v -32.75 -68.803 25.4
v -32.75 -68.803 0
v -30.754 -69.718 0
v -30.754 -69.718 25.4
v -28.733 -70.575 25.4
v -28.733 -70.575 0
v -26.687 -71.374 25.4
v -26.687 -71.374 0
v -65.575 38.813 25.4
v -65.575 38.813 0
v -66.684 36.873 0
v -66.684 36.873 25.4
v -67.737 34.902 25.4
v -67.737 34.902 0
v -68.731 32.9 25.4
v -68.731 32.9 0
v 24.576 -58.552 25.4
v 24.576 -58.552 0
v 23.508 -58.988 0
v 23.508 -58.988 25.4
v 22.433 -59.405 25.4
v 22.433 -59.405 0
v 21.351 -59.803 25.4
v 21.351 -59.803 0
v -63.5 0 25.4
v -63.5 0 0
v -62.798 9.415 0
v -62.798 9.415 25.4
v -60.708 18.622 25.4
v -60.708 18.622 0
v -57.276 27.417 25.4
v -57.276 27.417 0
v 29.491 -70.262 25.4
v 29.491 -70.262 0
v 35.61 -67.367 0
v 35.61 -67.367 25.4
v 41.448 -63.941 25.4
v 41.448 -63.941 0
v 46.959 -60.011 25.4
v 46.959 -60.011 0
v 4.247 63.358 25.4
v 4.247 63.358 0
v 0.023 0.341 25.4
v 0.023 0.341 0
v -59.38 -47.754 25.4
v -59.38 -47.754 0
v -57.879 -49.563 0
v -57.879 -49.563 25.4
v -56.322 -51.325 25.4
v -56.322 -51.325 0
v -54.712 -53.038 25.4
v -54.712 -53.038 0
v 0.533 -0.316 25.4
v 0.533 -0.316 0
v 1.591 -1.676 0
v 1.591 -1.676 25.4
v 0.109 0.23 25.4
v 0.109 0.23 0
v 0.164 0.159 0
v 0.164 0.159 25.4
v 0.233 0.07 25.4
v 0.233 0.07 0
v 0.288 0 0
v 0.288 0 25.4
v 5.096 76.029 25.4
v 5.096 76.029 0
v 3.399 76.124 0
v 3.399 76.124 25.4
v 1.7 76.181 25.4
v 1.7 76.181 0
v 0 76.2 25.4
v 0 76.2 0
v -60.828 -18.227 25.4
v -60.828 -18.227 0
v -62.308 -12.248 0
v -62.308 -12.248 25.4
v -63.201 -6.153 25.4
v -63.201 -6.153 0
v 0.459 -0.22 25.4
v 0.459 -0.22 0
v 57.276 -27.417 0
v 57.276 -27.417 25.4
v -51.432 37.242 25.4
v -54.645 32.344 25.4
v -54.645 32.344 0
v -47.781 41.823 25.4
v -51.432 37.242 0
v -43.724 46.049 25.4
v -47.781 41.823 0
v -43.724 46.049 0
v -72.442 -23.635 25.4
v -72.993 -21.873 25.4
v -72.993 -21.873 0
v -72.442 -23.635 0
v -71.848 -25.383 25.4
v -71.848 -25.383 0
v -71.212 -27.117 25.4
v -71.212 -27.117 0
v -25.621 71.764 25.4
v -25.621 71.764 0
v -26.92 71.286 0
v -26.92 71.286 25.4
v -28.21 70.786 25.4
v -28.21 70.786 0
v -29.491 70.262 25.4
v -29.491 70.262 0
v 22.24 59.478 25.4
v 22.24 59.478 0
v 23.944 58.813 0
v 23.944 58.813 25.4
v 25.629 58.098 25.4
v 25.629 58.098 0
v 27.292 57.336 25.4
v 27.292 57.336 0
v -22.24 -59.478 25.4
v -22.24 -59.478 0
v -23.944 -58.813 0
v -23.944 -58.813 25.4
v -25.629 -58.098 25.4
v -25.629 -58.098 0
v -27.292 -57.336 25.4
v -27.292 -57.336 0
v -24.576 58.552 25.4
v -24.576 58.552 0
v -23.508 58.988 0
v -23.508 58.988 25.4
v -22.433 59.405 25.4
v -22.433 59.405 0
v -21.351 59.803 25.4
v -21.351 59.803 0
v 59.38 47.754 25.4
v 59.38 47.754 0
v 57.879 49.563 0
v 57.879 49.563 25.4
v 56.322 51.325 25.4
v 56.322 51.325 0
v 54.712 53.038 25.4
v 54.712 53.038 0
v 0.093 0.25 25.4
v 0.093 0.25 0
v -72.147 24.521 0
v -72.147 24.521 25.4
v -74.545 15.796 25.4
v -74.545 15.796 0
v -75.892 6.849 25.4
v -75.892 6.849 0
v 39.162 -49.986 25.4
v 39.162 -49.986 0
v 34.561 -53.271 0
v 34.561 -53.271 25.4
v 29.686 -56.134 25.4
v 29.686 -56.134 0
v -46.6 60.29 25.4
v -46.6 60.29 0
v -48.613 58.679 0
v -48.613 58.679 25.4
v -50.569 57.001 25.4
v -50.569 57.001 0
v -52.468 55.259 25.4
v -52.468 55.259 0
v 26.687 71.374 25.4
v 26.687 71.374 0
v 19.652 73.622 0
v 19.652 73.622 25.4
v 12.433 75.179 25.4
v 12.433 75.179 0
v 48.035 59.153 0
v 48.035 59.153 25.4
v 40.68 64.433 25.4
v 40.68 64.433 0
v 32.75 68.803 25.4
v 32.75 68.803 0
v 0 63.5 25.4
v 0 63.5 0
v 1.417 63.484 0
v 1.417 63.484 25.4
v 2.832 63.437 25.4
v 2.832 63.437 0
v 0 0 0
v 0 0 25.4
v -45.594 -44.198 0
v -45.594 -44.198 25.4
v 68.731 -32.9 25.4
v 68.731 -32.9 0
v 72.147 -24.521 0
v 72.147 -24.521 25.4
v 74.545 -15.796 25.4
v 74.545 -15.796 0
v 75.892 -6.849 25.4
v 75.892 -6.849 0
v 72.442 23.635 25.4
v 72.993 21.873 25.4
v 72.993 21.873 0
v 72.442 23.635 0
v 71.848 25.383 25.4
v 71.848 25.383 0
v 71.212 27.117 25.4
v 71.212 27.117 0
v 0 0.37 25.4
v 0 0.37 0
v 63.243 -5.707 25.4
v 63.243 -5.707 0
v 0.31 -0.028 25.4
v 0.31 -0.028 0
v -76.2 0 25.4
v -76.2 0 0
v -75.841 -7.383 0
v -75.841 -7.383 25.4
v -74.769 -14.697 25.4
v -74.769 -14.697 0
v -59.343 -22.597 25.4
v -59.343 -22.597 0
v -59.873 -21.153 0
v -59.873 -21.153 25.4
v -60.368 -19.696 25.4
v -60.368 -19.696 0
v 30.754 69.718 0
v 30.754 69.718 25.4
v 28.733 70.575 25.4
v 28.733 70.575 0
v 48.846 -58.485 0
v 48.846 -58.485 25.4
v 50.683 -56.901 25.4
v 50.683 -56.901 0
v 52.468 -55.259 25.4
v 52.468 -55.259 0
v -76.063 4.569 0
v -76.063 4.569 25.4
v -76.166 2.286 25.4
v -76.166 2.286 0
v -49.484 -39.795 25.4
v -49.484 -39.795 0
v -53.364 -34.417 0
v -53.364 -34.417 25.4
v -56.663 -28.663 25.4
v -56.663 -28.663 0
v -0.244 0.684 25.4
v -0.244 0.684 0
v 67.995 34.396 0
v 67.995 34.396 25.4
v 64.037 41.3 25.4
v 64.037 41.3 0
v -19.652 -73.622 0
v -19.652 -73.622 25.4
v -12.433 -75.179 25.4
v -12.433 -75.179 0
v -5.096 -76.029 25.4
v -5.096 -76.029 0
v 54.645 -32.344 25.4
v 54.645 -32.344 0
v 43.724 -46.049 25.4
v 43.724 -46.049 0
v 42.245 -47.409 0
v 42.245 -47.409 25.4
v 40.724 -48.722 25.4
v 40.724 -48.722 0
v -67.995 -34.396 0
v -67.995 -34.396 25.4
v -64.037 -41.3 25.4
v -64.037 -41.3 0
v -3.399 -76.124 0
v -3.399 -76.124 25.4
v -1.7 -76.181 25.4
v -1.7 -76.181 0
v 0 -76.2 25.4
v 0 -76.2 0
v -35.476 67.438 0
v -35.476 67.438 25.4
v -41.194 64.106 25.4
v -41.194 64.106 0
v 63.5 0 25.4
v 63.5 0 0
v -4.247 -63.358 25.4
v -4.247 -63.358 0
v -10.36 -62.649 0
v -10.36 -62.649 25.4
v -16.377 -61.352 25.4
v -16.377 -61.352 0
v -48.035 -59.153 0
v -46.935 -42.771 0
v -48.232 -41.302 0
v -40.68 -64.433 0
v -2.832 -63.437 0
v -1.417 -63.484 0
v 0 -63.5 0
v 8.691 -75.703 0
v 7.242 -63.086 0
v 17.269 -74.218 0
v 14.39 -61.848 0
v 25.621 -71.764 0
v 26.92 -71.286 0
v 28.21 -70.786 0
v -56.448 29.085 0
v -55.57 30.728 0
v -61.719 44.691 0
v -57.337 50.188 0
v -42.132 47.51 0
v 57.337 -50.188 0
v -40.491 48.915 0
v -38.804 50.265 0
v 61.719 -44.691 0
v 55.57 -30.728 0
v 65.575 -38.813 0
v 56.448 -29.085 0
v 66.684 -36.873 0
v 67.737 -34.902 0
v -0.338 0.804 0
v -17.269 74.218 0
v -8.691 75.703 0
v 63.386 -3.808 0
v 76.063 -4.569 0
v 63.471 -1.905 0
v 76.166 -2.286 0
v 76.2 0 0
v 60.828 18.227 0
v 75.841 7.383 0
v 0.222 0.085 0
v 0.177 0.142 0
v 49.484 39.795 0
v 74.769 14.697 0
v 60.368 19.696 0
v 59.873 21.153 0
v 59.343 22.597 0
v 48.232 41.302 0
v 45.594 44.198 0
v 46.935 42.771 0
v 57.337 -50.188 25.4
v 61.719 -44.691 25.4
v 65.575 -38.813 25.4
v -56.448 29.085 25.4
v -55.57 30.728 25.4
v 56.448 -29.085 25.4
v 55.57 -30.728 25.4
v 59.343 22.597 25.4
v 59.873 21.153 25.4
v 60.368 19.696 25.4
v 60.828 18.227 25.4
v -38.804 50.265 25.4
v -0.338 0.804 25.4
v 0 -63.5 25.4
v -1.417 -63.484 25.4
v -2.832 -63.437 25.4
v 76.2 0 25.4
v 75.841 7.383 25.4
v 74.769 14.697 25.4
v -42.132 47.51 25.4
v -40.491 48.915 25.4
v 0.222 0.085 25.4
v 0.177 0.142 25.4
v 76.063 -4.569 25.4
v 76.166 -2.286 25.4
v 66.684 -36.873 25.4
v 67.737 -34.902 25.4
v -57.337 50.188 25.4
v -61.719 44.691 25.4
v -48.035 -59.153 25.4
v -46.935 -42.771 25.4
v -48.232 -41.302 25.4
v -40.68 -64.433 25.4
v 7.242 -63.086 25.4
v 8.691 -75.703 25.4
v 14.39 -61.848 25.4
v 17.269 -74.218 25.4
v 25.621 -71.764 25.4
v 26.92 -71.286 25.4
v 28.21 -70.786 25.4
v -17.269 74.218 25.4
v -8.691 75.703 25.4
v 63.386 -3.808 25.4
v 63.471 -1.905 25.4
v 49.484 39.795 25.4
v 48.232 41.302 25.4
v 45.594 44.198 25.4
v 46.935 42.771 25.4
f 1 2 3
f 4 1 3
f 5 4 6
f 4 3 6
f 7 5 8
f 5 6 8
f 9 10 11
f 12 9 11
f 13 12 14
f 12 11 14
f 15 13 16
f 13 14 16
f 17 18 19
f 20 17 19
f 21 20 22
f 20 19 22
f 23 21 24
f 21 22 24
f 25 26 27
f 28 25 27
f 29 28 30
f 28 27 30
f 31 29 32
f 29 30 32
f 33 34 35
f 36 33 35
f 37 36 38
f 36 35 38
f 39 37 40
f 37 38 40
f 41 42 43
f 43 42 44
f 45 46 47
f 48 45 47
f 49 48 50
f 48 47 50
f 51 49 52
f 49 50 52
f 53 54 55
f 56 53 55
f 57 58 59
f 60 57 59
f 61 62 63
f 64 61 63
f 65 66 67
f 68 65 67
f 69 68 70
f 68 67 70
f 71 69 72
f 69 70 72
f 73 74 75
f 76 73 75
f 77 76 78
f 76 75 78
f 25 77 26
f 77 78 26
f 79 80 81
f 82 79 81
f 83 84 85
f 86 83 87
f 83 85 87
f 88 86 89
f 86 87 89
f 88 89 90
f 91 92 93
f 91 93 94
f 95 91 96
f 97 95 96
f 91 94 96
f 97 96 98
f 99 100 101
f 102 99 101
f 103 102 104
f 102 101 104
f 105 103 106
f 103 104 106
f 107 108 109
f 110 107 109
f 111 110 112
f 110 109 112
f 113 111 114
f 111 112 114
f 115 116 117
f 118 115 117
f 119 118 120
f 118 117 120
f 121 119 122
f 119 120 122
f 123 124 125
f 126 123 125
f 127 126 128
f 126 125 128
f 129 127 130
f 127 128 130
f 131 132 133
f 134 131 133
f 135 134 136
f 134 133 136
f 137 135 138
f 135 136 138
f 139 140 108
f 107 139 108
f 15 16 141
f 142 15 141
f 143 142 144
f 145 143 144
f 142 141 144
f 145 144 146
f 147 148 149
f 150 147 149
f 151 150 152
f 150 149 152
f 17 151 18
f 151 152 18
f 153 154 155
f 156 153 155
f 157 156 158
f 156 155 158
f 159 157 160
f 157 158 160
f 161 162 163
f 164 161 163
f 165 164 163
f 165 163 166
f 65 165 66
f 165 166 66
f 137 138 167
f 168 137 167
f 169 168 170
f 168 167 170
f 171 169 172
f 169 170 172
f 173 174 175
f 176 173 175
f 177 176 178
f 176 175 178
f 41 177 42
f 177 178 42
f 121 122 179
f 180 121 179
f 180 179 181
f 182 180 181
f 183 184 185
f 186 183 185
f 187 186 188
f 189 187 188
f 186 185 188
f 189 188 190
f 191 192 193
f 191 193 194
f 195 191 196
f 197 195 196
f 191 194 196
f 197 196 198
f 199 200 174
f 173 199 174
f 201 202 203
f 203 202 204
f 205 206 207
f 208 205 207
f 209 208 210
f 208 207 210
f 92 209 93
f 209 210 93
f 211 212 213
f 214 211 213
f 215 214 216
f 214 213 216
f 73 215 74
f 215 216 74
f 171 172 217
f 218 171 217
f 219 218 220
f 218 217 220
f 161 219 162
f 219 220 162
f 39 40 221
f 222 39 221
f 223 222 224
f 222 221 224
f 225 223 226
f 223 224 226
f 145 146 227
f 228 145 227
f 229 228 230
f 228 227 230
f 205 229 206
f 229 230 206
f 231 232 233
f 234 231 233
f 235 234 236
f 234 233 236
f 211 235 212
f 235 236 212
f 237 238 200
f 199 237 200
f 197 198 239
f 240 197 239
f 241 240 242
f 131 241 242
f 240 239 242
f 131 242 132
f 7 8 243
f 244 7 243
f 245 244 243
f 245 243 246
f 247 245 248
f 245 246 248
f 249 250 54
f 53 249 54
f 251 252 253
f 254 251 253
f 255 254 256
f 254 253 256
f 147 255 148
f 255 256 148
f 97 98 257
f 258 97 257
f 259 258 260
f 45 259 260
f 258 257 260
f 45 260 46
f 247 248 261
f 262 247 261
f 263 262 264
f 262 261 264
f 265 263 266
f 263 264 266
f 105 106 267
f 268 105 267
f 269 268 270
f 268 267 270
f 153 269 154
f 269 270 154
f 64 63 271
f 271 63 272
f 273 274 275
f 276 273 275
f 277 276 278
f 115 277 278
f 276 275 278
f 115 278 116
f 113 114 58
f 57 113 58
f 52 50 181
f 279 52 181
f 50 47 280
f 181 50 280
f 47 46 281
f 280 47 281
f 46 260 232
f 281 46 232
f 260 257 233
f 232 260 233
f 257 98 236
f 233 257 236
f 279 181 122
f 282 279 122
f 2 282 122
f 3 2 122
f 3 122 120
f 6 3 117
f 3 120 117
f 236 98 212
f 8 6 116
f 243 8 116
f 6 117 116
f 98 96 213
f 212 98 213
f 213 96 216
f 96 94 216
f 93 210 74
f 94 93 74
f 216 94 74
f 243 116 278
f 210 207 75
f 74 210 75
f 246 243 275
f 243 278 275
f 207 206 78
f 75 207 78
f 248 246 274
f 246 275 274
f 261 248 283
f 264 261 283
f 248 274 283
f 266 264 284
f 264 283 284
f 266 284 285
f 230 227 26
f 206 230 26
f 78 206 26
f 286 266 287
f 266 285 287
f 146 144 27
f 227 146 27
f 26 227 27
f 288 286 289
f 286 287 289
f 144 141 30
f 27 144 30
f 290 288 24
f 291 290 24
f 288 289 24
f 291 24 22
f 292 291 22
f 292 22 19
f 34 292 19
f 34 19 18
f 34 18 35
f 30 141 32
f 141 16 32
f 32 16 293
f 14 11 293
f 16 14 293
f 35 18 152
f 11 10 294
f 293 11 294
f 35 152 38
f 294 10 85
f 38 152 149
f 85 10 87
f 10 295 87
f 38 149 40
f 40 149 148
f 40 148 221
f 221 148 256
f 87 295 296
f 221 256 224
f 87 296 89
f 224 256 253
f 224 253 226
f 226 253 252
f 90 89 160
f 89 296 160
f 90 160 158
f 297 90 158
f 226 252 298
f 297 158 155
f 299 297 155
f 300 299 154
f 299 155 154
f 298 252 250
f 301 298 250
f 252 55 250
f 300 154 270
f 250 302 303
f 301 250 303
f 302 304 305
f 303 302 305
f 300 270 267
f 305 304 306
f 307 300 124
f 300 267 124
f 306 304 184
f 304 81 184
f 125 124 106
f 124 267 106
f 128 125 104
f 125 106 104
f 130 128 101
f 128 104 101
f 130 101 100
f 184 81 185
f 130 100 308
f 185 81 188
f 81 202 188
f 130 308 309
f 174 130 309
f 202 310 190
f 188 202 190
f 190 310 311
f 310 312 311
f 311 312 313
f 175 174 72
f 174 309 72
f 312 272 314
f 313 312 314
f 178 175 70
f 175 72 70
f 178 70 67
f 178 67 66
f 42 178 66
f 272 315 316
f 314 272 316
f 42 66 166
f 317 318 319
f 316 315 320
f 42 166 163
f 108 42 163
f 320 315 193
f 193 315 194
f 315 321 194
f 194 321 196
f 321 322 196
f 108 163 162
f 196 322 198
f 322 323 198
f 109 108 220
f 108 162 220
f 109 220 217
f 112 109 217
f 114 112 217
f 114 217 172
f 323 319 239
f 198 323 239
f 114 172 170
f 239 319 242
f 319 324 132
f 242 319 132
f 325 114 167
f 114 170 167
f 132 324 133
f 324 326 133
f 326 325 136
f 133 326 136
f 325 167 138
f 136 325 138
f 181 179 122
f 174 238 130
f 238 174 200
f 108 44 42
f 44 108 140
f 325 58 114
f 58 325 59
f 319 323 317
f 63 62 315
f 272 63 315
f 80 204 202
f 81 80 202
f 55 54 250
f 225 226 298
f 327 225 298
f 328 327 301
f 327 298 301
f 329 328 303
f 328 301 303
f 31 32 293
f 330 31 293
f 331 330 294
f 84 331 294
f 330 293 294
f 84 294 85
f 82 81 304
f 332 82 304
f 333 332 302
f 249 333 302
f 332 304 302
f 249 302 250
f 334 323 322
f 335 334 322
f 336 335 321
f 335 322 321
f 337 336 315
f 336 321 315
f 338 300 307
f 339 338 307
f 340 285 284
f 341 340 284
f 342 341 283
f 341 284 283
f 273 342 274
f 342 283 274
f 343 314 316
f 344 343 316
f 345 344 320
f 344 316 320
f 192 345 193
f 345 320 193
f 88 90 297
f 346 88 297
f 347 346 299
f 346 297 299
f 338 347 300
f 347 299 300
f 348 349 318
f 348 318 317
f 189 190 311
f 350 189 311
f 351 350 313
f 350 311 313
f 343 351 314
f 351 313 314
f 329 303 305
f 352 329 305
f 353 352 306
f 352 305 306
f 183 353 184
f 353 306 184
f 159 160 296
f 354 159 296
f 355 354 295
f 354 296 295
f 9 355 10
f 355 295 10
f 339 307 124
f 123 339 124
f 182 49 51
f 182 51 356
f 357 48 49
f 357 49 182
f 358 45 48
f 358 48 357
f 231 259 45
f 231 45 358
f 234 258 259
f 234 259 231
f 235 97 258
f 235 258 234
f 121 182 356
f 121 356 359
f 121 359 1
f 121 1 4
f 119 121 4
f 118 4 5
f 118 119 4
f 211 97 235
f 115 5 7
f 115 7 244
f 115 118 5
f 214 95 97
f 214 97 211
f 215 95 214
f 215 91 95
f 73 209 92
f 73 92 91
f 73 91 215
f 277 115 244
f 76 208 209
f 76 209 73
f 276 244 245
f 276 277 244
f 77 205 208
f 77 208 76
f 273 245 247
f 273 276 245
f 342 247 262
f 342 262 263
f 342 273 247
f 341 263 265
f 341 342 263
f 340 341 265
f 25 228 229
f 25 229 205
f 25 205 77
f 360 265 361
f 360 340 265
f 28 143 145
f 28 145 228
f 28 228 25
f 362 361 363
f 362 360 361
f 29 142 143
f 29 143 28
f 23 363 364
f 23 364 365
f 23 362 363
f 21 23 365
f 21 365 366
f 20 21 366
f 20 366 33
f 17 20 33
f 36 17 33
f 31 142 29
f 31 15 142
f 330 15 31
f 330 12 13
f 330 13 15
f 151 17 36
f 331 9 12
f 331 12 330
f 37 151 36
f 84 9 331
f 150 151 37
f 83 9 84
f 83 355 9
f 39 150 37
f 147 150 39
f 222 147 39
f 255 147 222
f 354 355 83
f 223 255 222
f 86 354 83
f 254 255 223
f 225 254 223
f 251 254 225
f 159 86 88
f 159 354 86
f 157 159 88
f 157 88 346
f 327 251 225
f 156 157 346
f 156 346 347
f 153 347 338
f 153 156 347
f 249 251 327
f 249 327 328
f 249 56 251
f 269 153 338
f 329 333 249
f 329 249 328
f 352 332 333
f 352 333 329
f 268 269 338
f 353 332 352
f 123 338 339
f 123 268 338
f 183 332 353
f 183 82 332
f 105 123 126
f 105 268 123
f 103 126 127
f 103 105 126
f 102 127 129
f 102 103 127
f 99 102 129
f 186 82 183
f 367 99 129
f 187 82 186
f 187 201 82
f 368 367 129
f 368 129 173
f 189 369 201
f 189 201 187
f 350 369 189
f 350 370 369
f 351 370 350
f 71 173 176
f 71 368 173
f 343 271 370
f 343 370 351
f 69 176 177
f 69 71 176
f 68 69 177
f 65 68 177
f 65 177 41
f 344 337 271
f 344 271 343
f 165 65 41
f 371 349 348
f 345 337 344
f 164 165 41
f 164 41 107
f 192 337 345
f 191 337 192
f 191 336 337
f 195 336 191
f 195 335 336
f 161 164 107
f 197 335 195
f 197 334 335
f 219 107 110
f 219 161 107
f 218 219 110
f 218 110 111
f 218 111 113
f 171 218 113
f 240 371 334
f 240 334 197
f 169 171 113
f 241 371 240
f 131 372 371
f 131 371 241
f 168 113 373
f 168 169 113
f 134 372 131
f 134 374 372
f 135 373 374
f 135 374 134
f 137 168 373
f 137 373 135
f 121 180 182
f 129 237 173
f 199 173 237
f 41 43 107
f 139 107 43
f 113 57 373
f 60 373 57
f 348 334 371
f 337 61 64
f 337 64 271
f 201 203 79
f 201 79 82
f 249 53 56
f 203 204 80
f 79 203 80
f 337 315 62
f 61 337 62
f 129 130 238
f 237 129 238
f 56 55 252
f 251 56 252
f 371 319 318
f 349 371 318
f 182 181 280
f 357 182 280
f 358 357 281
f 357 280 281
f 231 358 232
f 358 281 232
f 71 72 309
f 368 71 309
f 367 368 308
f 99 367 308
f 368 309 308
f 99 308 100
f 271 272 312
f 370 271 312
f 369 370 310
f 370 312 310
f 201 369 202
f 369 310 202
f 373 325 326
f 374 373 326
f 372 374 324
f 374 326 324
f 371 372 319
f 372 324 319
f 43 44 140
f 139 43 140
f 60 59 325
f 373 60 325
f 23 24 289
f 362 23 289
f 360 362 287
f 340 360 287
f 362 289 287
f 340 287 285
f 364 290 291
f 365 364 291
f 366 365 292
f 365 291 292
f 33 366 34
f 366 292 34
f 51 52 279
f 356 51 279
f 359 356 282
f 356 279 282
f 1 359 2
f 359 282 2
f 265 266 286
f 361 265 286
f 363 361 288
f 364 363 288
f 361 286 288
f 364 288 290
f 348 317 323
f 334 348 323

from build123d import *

# Parameters (mm, degrees)
F1_DEPTH = 25.4
F2_DEPTH = 25.4
F3_DEPTH = 25.4


with BuildPart() as f1:
    # F0 (on Top) → F1 (new body)
    with BuildSketch(Plane.XY):
        with BuildLine():
            ThreePointArc((-54.6454294548, 32.3438872076), (-49.6595784817, 39.574944915), (-43.7236170719, 46.0488361432))
            Line((-43.7236170719, 46.0488361432), (-52.4683404863, 55.2586033719))
            ThreePointArc((-52.4683404863, 55.2586033719), (-59.591494178, 47.489933898), (-65.5745153458, 38.8126646491))
            Line((-65.5745153458, 38.8126646491), (-54.6454294548, 32.3438872076))
        make_face()
        with BuildLine():
            Line((-52.4683404863, 55.2586033719), (-43.7236170719, 46.0488361432))
            ThreePointArc((-43.7236170719, 46.0488361432), (-41.3174458853, 48.2194842933), (-38.8036697839, 50.2645522342))
            Line((-38.8036697839, 50.2645522342), (-46.6003690954, 60.2896807105))
            ThreePointArc((-46.6003690954, 60.2896807105), (-49.5981878635, 57.8485934199), (-52.4683404863, 55.2586033719))
        make_face()
        with BuildLine():
            Line((-46.6003690954, 60.2896807105), (-38.8036697839, 50.2645522342))
            ThreePointArc((-38.8036697839, 50.2645522342), (-31.9594802346, 54.8711365212), (-24.5758212425, 58.5515073269))
            Line((-24.5758212425, 58.5515073269), (-29.490985491, 70.2618087923))
            ThreePointArc((-29.490985491, 70.2618087923), (-38.3710098293, 65.8339244211), (-46.6003690954, 60.2896807105))
        make_face()
        with BuildLine():
            Line((-29.490985491, 70.2618087923), (-24.5758212425, 58.5515073269))
            ThreePointArc((-24.5758212425, 58.5515073269), (-22.971715152, 59.1992424189), (-21.3505595618, 59.80304011))
            Line((-21.3505595618, 59.80304011), (-25.6206714742, 71.763648132))
            ThreePointArc((-25.6206714742, 71.763648132), (-27.5660581824, 71.0390909027), (-29.490985491, 70.2618087923))
        make_face()
        with BuildLine():
            ThreePointArc((-21.3505595618, 59.80304011), (-10.8341347835, 62.5689341726), (0, 63.5))
            Line((0, 63.5), (0, 76.2))
            ThreePointArc((0, 76.2), (-13.0009617403, 75.0827210071), (-25.6206714742, 71.763648132))
            Line((-25.6206714742, 71.763648132), (-21.3505595618, 59.80304011))
        make_face()
        with BuildLine():
            Line((0, 76.2), (0, 63.5))
            ThreePointArc((0, 63.5), (2.1245390247, 63.4644493708), (4.2466991927, 63.3578372892))
            Line((4.2466991927, 63.3578372892), (5.0960390312, 76.0294047471))
            ThreePointArc((5.0960390312, 76.0294047471), (2.5494468296, 76.1573392449), (0, 76.2))
        make_face()
        with BuildLine():
            ThreePointArc((4.2466991927, 63.3578372892), (13.3844402215, 62.0733981667), (22.2395451076, 59.4781693852))
            Line((22.2395451075, 59.4781693852), (26.6874541291, 71.3738032622))
            ThreePointArc((26.6874541291, 71.3738032622), (16.0613282658, 74.4880778), (5.0960390312, 76.0294047471))
            Line((5.0960390312, 76.0294047471), (4.2466991927, 63.3578372892))
        make_face()
        with BuildLine():
            Line((27.2918502922, 57.335895455), (32.7502203506, 68.803074546))
            ThreePointArc((32.7502203506, 68.803074546), (29.74662079, 70.1539631922), (26.6874541291, 71.3738032622))
            Line((26.6874541291, 71.3738032622), (22.2395451075, 59.4781693852))
            ThreePointArc((22.2395451076, 59.4781693852), (24.7888506583, 58.4616359935), (27.2918502922, 57.335895455))
        make_face()
        with BuildLine():
            Line((45.5935282898, 44.1981920229), (54.7122339477, 53.0378304275))
            ThreePointArc((54.7122339477, 53.0378304275), (44.4359759486, 61.9022135428), (32.7502203506, 68.803074546))
            Line((32.7502203506, 68.803074546), (27.2918502922, 57.335895455))
            ThreePointArc((27.2918502922, 57.335895455), (37.0299799571, 51.5851779523), (45.5935282898, 44.1981920229))
        make_face()
        with BuildLine():
            Line((49.4835493014, 39.7948281631), (59.3802591617, 47.7537937958))
            ThreePointArc((59.3802591617, 47.7537937958), (57.1073945016, 50.4498314491), (54.7122339477, 53.0378304275))
            Line((54.7122339477, 53.0378304275), (45.5935282898, 44.1981920229))
            ThreePointArc((45.5935282898, 44.1981920229), (47.589495418, 42.0415262075), (49.4835493014, 39.7948281631))
        make_face()
        with BuildLine():
            Line((59.3431659035, 22.5973153393), (71.2117990842, 27.1167784072))
            ThreePointArc((71.2117990842, 27.1167784072), (66.106300912, 37.8998282283), (59.3802591617, 47.7537937958))
            Line((59.3802591617, 47.7537937958), (49.4835493014, 39.7948281631))
            ThreePointArc((49.4835493014, 39.7948281631), (55.0885840933, 31.5831901902), (59.3431659035, 22.5973153393))
        make_face()
        with BuildLine():
            Line((60.8277151615, 18.2274262647), (72.9932581938, 21.8729115177))
            ThreePointArc((72.9932581938, 21.8729115177), (72.1501848309, 24.5110348389), (71.2117990842, 27.1167784072))
            Line((71.2117990842, 27.1167784072), (59.3431659035, 22.5973153393))
            ThreePointArc((59.3431659035, 22.5973153393), (60.1251540257, 20.4258623657), (60.8277151615, 18.2274262647))
        make_face()
        with BuildLine():
            ThreePointArc((-60.8277151615, -18.2274262647), (-62.8283769994, -9.2111369344), (-63.5, 0))
            Line((-63.5, 0), (-76.2, 0))
            ThreePointArc((-76.2, 0), (-75.3940523993, -11.0533643212), (-72.9932581938, -21.8729115177))
            Line((-72.9932581938, -21.8729115177), (-60.8277151615, -18.2274262647))
        make_face()
        with BuildLine():
            Line((-76.2, 0), (-63.5, 0))
            ThreePointArc((-63.5, 0), (-63.4357184014, 2.8565067652), (-63.2430037512, 5.7072301974))
            Line((-63.2430037512, 5.7072301974), (-75.8916045014, 6.8486762369))
            ThreePointArc((-75.8916045014, 6.8486762369), (-76.1228620817, 3.4278081182), (-76.2, 0))
        make_face()
        with BuildLine():
            ThreePointArc((68.7314420597, -32.9002868133), (73.4753564303, -20.1943555836), (75.8916045014, -6.8486762369))
            Line((75.8916045014, -6.8486762369), (63.2430037512, -5.7072301974))
            ThreePointArc((63.2430037512, -5.7072301974), (61.2294636919, -16.828629653), (57.2762017164, -27.4169056777))
            Line((57.2762017164, -27.4169056777), (68.7314420597, -32.9002868133))
        make_face()
        with BuildLine():
            ThreePointArc((65.5745153458, -38.8126646491), (67.218015454, -35.8912022428), (68.7314420597, -32.9002868133))
            Line((68.7314420597, -32.9002868133), (57.2762017164, -27.4169056777))
            ThreePointArc((57.2762017164, -27.4169056777), (56.0150128783, -29.9093352023), (54.6454294548, -32.3438872076))
            Line((54.6454294548, -32.3438872076), (65.5745153458, -38.8126646491))
        make_face()
        with BuildLine():
            ThreePointArc((52.4683404863, -55.2586033719), (59.591494178, -47.489933898), (65.5745153458, -38.8126646491))
            Line((65.5745153458, -38.8126646491), (54.6454294548, -32.3438872076))
            ThreePointArc((54.6454294548, -32.3438872076), (49.6595784817, -39.574944915), (43.7236170719, -46.0488361432))
            Line((43.7236170719, -46.0488361432), (52.4683404863, -55.2586033719))
        make_face()
        with BuildLine():
            ThreePointArc((46.9591074707, -60.0106842617), (49.7704723708, -57.7004339671), (52.4683404863, -55.2586033719))
            Line((52.4683404863, -55.2586033719), (43.7236170719, -46.0488361432))
            ThreePointArc((43.7236170719, -46.0488361432), (41.4897304768, -48.0713247681), (39.1624081592, -49.9855557853))
            Line((39.1624081592, -49.9855557854), (46.9591074707, -60.0106842617))
        make_face()
        with BuildLine():
            ThreePointArc((39.1624081592, -49.9855557853), (32.1556270856, -54.7564210548), (24.5758212425, -58.5515073269))
            Line((24.5758212425, -58.5515073269), (29.490985491, -70.2618087923))
            ThreePointArc((29.490985491, -70.2618087923), (38.5671565843, -65.7192090108), (46.9591074707, -60.0106842617))
            Line((46.9591074707, -60.0106842617), (39.1624081592, -49.9855557854))
        make_face()
        with BuildLine():
            Line((29.490985491, -70.2618087923), (24.5758212425, -58.5515073269))
            ThreePointArc((24.5758212425, -58.5515073269), (22.971715152, -59.1992424189), (21.3505595618, -59.80304011))
            Line((21.3505595618, -59.80304011), (25.6206714742, -71.763648132))
            ThreePointArc((25.6206714742, -71.763648132), (27.5660581824, -71.0390909027), (29.490985491, -70.2618087923))
        make_face()
        with BuildLine():
            ThreePointArc((21.3505595618, -59.80304011), (10.8341347835, -62.5689341726), (0, -63.5))
            Line((0, -63.5), (0, -76.2))
            ThreePointArc((0, -76.2), (13.0009617403, -75.0827210071), (25.6206714742, -71.763648132))
            Line((25.6206714742, -71.763648132), (21.3505595618, -59.80304011))
        make_face()
        with BuildLine():
            Line((0, -76.2), (0, -63.5))
            ThreePointArc((0, -63.5), (-2.1245390247, -63.4644493708), (-4.2466991927, -63.3578372892))
            Line((-4.2466991927, -63.3578372892), (-5.0960390312, -76.0294047471))
            ThreePointArc((-5.0960390312, -76.0294047471), (-2.5494468296, -76.1573392449), (0, -76.2))
        make_face()
        with BuildLine():
            ThreePointArc((-4.2466991927, -63.3578372892), (-13.3844402215, -62.0733981667), (-22.2395451076, -59.4781693852))
            Line((-22.2395451075, -59.4781693852), (-26.6874541291, -71.3738032622))
            ThreePointArc((-26.6874541291, -71.3738032622), (-16.0613282658, -74.4880778), (-5.0960390312, -76.0294047471))
            Line((-5.0960390312, -76.0294047471), (-4.2466991927, -63.3578372892))
        make_face()
        with BuildLine():
            Line((-26.6874541291, -71.3738032622), (-22.2395451075, -59.4781693852))
            ThreePointArc((-22.2395451076, -59.4781693852), (-24.7888506583, -58.4616359935), (-27.2918502922, -57.335895455))
            Line((-27.2918502922, -57.335895455), (-32.7502203506, -68.803074546))
            ThreePointArc((-32.7502203506, -68.803074546), (-29.74662079, -70.1539631922), (-26.6874541291, -71.3738032622))
        make_face()
        with BuildLine():
            ThreePointArc((-27.2918502922, -57.335895455), (-37.0299799571, -51.5851779523), (-45.5935282898, -44.1981920229))
            Line((-45.5935282898, -44.1981920229), (-54.7122339477, -53.0378304275))
            ThreePointArc((-54.7122339477, -53.0378304275), (-44.4359759486, -61.9022135428), (-32.7502203506, -68.803074546))
            Line((-32.7502203506, -68.803074546), (-27.2918502922, -57.335895455))
        make_face()
        with BuildLine():
            ThreePointArc((-49.4835493014, -39.7948281631), (-55.0885840933, -31.5831901902), (-59.3431659035, -22.5973153393))
            Line((-59.3431659035, -22.5973153393), (-71.2117990842, -27.1167784072))
            ThreePointArc((-71.2117990842, -27.1167784072), (-66.106300912, -37.8998282283), (-59.3802591617, -47.7537937958))
            Line((-59.3802591617, -47.7537937958), (-49.4835493014, -39.7948281631))
        make_face()
        with BuildLine():
            Line((63.5, 0), (76.2, 0))
            ThreePointArc((76.2, 0), (75.3940523993, 11.0533643212), (72.9932581938, 21.8729115177))
            Line((72.9932581938, 21.8729115177), (60.8277151615, 18.2274262647))
            ThreePointArc((60.8277151615, 18.2274262647), (62.8283769994, 9.2111369344), (63.5, 0))
        make_face()
        with BuildLine():
            ThreePointArc((-63.2430037512, 5.7072301974), (-61.2294636919, 16.828629653), (-57.2762017164, 27.4169056777))
            Line((-57.2762017164, 27.4169056777), (-68.7314420597, 32.9002868133))
            ThreePointArc((-68.7314420597, 32.9002868133), (-73.4753564303, 20.1943555836), (-75.8916045014, 6.8486762369))
            Line((-75.8916045014, 6.8486762369), (-63.2430037512, 5.7072301974))
        make_face()
        with BuildLine():
            Line((-54.7122339477, -53.0378304275), (-45.5935282898, -44.1981920229))
            ThreePointArc((-45.5935282898, -44.1981920229), (-47.589495418, -42.0415262075), (-49.4835493014, -39.7948281631))
            Line((-49.4835493014, -39.7948281631), (-59.3802591617, -47.7537937958))
            ThreePointArc((-59.3802591617, -47.7537937958), (-57.1073945016, -50.4498314491), (-54.7122339477, -53.0378304275))
        make_face()
        with BuildLine():
            Line((-71.2117990842, -27.1167784072), (-59.3431659035, -22.5973153393))
            ThreePointArc((-59.3431659035, -22.5973153393), (-60.1251540257, -20.4258623657), (-60.8277151615, -18.2274262647))
            Line((-60.8277151615, -18.2274262647), (-72.9932581938, -21.8729115177))
            ThreePointArc((-72.9932581938, -21.8729115177), (-72.1501848309, -24.5110348389), (-71.2117990842, -27.1167784072))
        make_face()
        with BuildLine():
            ThreePointArc((75.8916045014, -6.8486762369), (76.1228620817, -3.4278081182), (76.2, 0))
            Line((76.2, 0), (63.5, 0))
            ThreePointArc((63.5, 0), (63.4357184014, -2.8565067652), (63.2430037512, -5.7072301974))
            Line((63.2430037512, -5.7072301974), (75.8916045014, -6.8486762369))
        make_face()
        with BuildLine():
            Line((-68.7314420597, 32.9002868133), (-57.2762017164, 27.4169056777))
            ThreePointArc((-57.2762017164, 27.4169056777), (-56.0150128783, 29.9093352023), (-54.6454294548, 32.3438872076))
            Line((-54.6454294548, 32.3438872076), (-65.5745153458, 38.8126646491))
            ThreePointArc((-65.5745153458, 38.8126646491), (-67.218015454, 35.8912022428), (-68.7314420597, 32.9002868133))
        make_face()
    extrude(amount=F1_DEPTH)

    # F0 (on Top) → F2 (join)
    with BuildSketch(Plane.XY):
        with BuildLine():
            Line((-38.8036697839, 50.2645522342), (-0.3375081808, 0.8041079289))
            Line((-0.3375081808, 0.8041079289), (-24.5758212425, 58.5515073269))
            ThreePointArc((-24.5758212425, 58.5515073269), (-31.9594802346, 54.8711365212), (-38.8036697839, 50.2645522342))
        make_face()
        with BuildLine():
            Line((-0.2442825508, 0.6842368296), (0, 0.3701341743))
            Line((0, 0.3701341743), (0, 63.5))
            ThreePointArc((0, 63.5), (-10.8341347835, 62.5689341726), (-21.3505595618, 59.80304011))
            Line((-21.3505595618, 59.80304011), (-0.2442825508, 0.6842368296))
        make_face()
        with BuildLine():
            Line((0.0228405548, 0.3407654008), (0.0934623297, 0.2499587223))
            Line((0.0934623297, 0.2499587223), (22.2395451075, 59.4781693852))
            ThreePointArc((22.2395451076, 59.4781693852), (13.3844402215, 62.0733981667), (4.2466991927, 63.3578372892))
            Line((4.2466991927, 63.3578372892), (0.0228405548, 0.3407654008))
        make_face()
        with BuildLine():
            Line((0.1092917989, 0.2296049219), (0.1641238083, 0.1591009923))
            Line((0.1641238083, 0.1591009923), (45.5935282898, 44.1981920229))
            ThreePointArc((45.5935282898, 44.1981920229), (37.0299799571, 51.5851779523), (27.2918502922, 57.335895455))
            Line((27.2918502922, 57.335895455), (0.1092917989, 0.2296049219))
        make_face()
        with BuildLine():
            Line((0.222088386, 0.0845691532), (59.3431659035, 22.5973153393))
            ThreePointArc((59.3431659035, 22.5973153393), (55.0885840933, 31.5831901902), (49.4835493014, 39.7948281631))
            Line((49.4835493014, 39.7948281631), (0.1770959808, 0.1424211525))
            Line((0.1770959808, 0.1424211525), (0.222088386, 0.0845691532))
        make_face()
        with BuildLine():
            Line((0.28785914, 0), (63.5, 0))
            ThreePointArc((63.5, 0), (62.8283769994, 9.2111369344), (60.8277151615, 18.2274262647))
            Line((60.8277151615, 18.2274262647), (0.2334533831, 0.0699558469))
            Line((0.2334533831, 0.0699558469), (0.28785914, 0))
        make_face()
        with BuildLine():
            ThreePointArc((57.2762017164, -27.4169056777), (61.2294636919, -16.828629653), (63.2430037512, -5.7072301974))
            Line((63.2430037512, -5.7072301974), (0.3095869732, -0.0279380171))
            Line((0.3095869732, -0.0279380171), (0.4585759838, -0.219510619))
            Line((0.4585759838, -0.219510619), (57.2762017164, -27.4169056777))
        make_face()
        with BuildLine():
            ThreePointArc((43.7236170719, -46.0488361432), (49.6595784817, -39.574944915), (54.6454294548, -32.3438872076))
            Line((54.6454294548, -32.3438872076), (0.5333878977, -0.3157050493))
            Line((0.5333878977, -0.3157050493), (1.5910370144, -1.6756482579))
            Line((1.5910370144, -1.6756482579), (43.7236170719, -46.0488361432))
        make_face()
    extrude(amount=F2_DEPTH)

    # F0 (on Top) → F3 (join)
    with BuildSketch(Plane.XY):
        with BuildLine():
            Line((-27.2918502922, -57.335895455), (0, 0))
            Line((0, 0), (-45.5935282898, -44.1981920229))
            ThreePointArc((-45.5935282898, -44.1981920229), (-37.0299799571, -51.5851779523), (-27.2918502922, -57.335895455))
        make_face()
    extrude(amount=F3_DEPTH)


solid = f1.part
